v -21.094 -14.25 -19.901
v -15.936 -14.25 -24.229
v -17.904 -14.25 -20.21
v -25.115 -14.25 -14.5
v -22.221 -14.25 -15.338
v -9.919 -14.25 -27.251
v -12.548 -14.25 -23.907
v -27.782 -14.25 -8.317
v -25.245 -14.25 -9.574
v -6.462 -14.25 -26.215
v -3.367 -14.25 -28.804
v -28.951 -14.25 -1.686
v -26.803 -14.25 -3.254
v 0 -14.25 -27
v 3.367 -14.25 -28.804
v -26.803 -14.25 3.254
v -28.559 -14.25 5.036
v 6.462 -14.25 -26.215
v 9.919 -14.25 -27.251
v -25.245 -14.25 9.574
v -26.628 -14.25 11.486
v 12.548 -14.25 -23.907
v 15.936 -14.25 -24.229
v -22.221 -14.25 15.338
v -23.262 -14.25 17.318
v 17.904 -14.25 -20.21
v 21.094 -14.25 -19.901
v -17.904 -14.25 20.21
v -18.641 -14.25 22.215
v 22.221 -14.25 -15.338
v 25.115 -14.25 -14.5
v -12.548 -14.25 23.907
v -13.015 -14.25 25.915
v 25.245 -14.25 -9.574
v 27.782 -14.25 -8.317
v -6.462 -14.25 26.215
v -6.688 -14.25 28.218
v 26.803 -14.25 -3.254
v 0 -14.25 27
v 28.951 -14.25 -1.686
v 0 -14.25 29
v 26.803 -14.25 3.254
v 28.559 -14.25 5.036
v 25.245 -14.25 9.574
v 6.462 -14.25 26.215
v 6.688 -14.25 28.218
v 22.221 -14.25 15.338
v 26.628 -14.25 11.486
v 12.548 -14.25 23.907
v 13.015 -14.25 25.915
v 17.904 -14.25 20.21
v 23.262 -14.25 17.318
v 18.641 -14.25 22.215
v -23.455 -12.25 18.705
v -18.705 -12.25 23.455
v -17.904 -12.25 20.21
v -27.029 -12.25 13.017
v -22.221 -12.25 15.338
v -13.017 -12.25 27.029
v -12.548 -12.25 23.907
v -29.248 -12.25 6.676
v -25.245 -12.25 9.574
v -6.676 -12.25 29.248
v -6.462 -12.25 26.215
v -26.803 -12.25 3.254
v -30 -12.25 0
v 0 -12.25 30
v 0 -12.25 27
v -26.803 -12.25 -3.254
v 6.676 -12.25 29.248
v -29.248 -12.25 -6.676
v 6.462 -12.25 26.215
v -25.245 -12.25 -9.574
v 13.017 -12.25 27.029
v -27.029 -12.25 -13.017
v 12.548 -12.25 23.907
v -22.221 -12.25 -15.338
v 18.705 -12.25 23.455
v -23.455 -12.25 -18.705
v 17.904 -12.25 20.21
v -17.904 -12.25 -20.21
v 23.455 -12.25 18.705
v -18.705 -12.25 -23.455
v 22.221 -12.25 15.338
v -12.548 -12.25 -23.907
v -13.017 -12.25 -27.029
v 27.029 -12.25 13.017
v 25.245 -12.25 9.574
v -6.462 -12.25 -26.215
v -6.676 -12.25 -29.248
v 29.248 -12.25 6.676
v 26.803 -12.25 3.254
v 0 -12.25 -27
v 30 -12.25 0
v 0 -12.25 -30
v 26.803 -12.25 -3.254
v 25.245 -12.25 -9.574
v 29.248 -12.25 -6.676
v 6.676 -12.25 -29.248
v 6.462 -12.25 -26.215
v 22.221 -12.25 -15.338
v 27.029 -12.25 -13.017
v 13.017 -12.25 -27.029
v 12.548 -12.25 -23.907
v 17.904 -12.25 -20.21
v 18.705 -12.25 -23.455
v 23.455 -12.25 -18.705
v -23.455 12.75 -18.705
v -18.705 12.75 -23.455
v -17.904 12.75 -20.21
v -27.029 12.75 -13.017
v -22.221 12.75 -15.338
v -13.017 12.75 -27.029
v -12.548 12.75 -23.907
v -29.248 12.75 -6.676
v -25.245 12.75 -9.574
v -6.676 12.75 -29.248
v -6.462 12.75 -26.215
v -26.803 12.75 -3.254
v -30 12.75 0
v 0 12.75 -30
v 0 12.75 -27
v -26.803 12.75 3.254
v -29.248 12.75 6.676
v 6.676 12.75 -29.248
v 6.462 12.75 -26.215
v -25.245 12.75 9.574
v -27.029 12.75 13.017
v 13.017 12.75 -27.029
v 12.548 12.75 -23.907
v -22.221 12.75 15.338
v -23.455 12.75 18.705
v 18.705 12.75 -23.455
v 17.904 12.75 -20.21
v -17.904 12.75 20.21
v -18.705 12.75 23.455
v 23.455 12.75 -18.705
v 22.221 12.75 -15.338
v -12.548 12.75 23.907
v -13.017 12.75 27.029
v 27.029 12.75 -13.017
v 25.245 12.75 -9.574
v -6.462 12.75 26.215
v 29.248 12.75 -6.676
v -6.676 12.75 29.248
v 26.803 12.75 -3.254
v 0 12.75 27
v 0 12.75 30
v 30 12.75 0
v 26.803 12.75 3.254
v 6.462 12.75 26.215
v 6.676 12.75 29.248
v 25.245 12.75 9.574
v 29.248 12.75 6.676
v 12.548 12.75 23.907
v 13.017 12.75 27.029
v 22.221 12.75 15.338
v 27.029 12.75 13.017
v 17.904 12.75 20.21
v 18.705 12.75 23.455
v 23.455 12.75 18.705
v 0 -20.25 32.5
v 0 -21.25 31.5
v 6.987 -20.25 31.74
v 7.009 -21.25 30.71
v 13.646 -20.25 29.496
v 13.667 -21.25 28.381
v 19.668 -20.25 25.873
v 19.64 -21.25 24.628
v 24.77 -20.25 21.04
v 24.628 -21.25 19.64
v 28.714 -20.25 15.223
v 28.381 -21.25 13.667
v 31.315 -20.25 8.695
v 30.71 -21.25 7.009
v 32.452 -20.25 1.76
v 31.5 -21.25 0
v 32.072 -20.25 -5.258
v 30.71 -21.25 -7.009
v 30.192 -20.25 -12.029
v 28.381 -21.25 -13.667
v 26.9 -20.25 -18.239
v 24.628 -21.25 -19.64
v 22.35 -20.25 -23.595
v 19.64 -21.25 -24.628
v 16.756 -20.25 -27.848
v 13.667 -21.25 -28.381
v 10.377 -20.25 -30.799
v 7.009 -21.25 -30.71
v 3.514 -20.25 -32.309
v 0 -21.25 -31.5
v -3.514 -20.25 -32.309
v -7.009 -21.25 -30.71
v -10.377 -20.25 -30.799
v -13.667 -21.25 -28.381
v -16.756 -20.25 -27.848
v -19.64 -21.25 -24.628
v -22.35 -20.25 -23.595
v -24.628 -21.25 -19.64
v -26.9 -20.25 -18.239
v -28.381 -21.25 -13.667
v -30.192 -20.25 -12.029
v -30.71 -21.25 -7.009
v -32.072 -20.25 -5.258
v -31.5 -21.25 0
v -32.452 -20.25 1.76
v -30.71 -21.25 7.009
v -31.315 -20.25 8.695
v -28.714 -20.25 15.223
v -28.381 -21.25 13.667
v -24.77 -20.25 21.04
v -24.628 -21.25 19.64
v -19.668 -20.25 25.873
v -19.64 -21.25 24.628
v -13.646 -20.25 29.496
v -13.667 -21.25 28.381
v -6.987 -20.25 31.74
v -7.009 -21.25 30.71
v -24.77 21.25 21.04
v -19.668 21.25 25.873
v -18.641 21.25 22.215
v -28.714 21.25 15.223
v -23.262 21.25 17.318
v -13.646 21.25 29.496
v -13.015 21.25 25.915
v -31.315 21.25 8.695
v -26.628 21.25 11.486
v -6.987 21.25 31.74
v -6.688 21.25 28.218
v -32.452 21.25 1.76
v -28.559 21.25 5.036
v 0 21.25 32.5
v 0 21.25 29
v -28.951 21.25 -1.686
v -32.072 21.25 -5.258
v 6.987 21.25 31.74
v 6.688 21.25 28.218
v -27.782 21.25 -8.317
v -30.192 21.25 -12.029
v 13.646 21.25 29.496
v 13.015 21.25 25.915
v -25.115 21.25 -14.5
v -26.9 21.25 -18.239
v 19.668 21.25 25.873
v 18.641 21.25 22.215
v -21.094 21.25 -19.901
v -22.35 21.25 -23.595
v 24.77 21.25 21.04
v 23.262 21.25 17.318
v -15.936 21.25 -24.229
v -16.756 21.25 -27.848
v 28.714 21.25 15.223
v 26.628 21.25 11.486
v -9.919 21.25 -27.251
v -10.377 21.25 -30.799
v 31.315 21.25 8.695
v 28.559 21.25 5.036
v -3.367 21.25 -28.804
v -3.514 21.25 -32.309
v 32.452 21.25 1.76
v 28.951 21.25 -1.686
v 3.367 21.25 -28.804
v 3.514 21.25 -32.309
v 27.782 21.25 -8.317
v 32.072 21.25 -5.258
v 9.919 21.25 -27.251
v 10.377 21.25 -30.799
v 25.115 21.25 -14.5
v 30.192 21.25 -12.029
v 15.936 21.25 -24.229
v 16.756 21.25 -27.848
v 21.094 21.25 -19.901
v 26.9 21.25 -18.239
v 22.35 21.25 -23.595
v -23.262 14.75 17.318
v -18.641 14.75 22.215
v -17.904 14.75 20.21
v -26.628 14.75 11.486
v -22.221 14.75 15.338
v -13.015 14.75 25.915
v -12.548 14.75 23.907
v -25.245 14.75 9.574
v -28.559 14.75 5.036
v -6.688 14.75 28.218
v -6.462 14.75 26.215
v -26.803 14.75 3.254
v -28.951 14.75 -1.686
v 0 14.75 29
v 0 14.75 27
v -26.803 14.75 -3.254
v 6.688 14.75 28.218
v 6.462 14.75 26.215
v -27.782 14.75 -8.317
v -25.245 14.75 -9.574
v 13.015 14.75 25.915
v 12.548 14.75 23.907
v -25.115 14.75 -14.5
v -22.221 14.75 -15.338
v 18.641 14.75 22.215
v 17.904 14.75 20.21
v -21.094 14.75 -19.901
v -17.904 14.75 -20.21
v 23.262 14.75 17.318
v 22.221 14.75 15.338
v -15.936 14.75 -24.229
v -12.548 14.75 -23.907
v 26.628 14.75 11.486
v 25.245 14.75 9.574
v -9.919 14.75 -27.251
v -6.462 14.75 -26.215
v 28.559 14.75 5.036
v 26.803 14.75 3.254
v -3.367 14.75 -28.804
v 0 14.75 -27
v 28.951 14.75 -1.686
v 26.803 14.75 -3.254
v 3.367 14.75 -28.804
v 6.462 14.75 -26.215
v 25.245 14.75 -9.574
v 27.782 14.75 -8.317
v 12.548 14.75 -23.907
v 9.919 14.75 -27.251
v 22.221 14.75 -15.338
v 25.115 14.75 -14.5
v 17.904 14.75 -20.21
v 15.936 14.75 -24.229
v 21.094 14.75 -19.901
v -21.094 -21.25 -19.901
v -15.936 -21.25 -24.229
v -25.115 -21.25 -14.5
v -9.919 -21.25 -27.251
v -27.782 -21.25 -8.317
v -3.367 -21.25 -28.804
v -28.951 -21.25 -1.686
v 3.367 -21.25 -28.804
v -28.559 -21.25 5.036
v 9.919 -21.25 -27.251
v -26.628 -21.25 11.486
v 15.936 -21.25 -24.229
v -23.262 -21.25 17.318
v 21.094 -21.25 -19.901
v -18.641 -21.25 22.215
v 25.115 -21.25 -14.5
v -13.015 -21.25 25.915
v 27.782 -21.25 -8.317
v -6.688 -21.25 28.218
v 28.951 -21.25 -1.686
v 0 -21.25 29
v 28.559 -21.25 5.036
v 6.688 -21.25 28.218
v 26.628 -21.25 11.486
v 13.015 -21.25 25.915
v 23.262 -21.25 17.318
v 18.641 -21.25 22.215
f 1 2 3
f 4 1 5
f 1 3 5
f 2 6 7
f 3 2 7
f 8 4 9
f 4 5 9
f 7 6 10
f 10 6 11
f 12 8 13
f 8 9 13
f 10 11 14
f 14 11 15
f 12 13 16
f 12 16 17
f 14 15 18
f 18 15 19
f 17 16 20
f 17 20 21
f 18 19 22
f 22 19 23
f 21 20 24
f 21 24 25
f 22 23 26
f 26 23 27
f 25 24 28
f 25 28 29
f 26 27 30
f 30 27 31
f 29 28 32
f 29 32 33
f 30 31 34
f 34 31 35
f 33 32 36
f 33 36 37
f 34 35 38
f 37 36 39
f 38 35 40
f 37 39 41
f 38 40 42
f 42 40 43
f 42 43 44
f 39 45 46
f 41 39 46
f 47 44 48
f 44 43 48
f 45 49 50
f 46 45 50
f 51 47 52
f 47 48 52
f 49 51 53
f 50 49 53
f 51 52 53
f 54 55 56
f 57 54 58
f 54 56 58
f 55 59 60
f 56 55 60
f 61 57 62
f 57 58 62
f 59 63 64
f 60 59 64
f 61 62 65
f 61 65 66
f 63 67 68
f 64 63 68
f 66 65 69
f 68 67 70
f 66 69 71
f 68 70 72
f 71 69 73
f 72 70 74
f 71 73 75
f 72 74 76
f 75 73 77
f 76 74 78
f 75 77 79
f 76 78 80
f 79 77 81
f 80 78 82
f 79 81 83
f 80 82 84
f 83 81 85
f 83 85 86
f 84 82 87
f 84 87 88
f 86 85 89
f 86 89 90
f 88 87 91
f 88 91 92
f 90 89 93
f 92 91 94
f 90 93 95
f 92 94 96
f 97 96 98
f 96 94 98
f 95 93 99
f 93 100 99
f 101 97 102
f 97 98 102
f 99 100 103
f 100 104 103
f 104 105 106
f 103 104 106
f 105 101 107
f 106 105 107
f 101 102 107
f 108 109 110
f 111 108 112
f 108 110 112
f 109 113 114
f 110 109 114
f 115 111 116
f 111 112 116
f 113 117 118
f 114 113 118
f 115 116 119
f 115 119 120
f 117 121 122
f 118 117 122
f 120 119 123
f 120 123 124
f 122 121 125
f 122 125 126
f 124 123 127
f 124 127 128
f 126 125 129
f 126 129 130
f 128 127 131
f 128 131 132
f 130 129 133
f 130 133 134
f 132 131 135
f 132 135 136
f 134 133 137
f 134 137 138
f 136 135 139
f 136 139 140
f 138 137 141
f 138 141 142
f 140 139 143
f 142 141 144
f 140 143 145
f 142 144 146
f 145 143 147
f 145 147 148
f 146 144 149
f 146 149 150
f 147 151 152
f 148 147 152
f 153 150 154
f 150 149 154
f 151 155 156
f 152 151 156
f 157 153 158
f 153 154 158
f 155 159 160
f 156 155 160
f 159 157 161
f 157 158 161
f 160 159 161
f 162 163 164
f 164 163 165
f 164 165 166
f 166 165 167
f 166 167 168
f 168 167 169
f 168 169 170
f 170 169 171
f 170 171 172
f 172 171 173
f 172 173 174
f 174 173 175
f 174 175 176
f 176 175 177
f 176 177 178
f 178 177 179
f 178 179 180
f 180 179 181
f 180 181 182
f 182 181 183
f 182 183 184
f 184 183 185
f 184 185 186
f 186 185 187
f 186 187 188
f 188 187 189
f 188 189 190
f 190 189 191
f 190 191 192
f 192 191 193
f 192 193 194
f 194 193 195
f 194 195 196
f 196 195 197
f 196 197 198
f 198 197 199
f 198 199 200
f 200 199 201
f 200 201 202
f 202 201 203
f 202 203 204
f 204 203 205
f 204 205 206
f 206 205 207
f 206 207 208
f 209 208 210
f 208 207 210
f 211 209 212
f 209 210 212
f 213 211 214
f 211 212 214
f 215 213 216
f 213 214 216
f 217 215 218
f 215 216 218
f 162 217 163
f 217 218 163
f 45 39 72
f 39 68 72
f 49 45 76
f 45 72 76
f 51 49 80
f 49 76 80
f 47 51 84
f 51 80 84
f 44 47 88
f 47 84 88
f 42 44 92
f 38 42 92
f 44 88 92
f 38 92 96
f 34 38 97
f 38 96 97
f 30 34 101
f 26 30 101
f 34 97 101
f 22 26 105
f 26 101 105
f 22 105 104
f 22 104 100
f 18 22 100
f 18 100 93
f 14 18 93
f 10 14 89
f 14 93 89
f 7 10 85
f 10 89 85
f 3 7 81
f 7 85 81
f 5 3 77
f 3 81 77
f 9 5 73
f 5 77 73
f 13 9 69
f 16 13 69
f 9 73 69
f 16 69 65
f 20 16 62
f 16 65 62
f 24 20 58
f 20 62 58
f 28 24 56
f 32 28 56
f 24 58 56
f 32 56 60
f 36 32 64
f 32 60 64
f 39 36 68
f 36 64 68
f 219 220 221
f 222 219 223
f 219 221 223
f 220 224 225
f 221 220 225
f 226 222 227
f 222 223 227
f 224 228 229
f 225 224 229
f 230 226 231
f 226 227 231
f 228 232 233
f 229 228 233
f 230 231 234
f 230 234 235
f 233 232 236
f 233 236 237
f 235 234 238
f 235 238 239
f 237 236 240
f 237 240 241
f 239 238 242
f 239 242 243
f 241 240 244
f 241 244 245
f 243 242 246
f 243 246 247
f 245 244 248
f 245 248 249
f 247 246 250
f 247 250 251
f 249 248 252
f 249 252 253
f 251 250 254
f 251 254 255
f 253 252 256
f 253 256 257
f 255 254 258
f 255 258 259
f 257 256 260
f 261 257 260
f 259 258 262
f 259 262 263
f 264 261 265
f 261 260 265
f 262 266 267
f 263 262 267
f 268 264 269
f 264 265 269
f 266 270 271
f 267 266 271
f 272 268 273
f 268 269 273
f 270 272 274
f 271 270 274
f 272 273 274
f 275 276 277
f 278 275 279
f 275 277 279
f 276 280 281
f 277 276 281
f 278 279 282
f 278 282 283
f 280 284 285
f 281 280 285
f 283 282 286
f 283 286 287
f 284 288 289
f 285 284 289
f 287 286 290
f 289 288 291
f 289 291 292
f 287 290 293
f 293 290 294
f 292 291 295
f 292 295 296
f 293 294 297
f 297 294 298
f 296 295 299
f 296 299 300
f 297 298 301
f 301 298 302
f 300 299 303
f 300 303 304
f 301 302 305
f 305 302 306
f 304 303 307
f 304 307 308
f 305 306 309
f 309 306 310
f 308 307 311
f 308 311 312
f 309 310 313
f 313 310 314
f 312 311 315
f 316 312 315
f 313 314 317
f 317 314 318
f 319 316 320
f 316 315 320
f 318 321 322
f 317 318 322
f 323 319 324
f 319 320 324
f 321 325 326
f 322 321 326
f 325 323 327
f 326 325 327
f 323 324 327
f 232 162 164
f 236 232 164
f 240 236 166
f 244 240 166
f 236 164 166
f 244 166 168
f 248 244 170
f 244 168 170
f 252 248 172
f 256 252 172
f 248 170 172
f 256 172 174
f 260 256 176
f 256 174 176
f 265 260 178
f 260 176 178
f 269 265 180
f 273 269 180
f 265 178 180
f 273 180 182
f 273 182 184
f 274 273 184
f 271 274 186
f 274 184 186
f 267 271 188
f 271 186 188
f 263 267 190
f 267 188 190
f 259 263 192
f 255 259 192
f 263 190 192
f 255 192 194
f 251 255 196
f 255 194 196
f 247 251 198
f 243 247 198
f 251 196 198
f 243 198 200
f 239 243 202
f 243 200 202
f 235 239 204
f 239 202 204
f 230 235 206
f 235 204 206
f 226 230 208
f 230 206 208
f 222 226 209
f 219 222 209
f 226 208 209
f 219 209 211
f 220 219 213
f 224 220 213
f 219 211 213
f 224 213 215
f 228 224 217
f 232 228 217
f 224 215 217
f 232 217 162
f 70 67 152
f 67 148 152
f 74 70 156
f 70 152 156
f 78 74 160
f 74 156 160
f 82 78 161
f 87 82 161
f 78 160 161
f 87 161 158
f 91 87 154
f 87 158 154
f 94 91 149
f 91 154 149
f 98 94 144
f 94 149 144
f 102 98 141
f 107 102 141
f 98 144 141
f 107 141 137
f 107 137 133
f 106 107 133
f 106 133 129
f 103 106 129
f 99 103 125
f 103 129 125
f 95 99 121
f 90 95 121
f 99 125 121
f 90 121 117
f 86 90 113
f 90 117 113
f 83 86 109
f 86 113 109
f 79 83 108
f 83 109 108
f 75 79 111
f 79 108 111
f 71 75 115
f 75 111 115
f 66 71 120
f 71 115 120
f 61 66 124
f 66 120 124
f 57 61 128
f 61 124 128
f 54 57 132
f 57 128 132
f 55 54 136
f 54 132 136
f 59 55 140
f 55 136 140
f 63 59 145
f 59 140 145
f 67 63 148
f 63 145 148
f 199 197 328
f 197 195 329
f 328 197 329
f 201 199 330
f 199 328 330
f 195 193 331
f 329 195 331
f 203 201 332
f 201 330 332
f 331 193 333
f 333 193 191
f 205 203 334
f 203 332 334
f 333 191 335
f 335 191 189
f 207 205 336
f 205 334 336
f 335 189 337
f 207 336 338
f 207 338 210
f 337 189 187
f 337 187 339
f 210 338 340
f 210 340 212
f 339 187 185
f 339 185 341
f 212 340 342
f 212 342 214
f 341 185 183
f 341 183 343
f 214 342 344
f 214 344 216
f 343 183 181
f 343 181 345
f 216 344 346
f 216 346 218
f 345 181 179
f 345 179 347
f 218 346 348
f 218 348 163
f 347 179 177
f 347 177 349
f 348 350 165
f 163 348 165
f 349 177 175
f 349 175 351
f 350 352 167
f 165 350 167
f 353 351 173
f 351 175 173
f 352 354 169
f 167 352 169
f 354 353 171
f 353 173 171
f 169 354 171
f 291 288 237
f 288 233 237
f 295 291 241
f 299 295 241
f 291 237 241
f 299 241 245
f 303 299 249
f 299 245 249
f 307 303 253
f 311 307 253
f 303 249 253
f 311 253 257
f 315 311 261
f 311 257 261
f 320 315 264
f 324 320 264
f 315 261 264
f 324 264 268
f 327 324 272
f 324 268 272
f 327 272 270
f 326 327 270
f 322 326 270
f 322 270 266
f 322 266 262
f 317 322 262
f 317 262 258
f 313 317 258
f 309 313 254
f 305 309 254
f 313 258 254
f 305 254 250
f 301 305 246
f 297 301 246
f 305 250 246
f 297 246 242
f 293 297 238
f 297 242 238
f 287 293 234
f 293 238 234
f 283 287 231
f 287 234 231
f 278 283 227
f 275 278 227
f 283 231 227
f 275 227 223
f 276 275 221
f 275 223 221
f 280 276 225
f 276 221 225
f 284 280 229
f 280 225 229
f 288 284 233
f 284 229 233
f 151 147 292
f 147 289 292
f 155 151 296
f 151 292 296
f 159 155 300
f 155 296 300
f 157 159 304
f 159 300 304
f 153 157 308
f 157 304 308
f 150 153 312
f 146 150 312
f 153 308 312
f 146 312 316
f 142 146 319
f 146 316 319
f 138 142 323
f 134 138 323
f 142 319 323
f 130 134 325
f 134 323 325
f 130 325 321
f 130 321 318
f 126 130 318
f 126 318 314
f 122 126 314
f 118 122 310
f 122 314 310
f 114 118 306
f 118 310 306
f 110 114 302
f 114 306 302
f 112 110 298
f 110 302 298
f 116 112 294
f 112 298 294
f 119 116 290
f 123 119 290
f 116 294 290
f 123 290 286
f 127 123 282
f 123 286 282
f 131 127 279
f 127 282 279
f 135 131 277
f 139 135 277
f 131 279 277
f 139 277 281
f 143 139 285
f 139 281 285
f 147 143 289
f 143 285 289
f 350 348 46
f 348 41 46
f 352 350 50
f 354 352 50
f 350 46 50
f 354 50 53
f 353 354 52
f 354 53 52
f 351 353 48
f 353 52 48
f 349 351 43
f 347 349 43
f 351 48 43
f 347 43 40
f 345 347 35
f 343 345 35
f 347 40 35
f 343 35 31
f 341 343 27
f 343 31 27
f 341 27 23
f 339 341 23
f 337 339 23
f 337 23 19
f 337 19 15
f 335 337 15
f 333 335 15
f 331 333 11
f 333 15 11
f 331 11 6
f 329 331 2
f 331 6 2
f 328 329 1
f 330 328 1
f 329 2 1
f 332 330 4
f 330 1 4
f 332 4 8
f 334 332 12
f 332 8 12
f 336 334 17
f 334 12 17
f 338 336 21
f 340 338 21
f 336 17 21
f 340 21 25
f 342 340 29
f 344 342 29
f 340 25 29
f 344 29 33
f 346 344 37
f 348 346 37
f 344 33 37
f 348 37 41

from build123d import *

# Parameters (mm, degrees)
CHAMFER1_SIZE = 1


with BuildPart() as part:
    # Sketch3 → Revolve2 (revolve)
    with BuildSketch(Plane(origin=(0, 0, 0), x_dir=(0, 0, -1), z_dir=(1, 0, 0))):
        Polygon((-29, -21.25), (-29, -14.25), (-27, -14.25), (-27, -12.25), (-30, -12.25), (-30, 12.75), (-27, 12.75), (-27, 14.75), (-29, 14.75), (-29, 21.25), (-32.5, 21.25), (-32.5, -21.25), align=None)
    revolve(axis=Axis((0, -21.25, 0), (0, 1, 0)))

    # Chamfer1
    chamfer1_edges = [part.edges().sort_by_distance(p)[0] for p in [
        (0, -21.25, -32.5),
    ]]
    chamfer(chamfer1_edges, length=CHAMFER1_SIZE)


solid = part.part
